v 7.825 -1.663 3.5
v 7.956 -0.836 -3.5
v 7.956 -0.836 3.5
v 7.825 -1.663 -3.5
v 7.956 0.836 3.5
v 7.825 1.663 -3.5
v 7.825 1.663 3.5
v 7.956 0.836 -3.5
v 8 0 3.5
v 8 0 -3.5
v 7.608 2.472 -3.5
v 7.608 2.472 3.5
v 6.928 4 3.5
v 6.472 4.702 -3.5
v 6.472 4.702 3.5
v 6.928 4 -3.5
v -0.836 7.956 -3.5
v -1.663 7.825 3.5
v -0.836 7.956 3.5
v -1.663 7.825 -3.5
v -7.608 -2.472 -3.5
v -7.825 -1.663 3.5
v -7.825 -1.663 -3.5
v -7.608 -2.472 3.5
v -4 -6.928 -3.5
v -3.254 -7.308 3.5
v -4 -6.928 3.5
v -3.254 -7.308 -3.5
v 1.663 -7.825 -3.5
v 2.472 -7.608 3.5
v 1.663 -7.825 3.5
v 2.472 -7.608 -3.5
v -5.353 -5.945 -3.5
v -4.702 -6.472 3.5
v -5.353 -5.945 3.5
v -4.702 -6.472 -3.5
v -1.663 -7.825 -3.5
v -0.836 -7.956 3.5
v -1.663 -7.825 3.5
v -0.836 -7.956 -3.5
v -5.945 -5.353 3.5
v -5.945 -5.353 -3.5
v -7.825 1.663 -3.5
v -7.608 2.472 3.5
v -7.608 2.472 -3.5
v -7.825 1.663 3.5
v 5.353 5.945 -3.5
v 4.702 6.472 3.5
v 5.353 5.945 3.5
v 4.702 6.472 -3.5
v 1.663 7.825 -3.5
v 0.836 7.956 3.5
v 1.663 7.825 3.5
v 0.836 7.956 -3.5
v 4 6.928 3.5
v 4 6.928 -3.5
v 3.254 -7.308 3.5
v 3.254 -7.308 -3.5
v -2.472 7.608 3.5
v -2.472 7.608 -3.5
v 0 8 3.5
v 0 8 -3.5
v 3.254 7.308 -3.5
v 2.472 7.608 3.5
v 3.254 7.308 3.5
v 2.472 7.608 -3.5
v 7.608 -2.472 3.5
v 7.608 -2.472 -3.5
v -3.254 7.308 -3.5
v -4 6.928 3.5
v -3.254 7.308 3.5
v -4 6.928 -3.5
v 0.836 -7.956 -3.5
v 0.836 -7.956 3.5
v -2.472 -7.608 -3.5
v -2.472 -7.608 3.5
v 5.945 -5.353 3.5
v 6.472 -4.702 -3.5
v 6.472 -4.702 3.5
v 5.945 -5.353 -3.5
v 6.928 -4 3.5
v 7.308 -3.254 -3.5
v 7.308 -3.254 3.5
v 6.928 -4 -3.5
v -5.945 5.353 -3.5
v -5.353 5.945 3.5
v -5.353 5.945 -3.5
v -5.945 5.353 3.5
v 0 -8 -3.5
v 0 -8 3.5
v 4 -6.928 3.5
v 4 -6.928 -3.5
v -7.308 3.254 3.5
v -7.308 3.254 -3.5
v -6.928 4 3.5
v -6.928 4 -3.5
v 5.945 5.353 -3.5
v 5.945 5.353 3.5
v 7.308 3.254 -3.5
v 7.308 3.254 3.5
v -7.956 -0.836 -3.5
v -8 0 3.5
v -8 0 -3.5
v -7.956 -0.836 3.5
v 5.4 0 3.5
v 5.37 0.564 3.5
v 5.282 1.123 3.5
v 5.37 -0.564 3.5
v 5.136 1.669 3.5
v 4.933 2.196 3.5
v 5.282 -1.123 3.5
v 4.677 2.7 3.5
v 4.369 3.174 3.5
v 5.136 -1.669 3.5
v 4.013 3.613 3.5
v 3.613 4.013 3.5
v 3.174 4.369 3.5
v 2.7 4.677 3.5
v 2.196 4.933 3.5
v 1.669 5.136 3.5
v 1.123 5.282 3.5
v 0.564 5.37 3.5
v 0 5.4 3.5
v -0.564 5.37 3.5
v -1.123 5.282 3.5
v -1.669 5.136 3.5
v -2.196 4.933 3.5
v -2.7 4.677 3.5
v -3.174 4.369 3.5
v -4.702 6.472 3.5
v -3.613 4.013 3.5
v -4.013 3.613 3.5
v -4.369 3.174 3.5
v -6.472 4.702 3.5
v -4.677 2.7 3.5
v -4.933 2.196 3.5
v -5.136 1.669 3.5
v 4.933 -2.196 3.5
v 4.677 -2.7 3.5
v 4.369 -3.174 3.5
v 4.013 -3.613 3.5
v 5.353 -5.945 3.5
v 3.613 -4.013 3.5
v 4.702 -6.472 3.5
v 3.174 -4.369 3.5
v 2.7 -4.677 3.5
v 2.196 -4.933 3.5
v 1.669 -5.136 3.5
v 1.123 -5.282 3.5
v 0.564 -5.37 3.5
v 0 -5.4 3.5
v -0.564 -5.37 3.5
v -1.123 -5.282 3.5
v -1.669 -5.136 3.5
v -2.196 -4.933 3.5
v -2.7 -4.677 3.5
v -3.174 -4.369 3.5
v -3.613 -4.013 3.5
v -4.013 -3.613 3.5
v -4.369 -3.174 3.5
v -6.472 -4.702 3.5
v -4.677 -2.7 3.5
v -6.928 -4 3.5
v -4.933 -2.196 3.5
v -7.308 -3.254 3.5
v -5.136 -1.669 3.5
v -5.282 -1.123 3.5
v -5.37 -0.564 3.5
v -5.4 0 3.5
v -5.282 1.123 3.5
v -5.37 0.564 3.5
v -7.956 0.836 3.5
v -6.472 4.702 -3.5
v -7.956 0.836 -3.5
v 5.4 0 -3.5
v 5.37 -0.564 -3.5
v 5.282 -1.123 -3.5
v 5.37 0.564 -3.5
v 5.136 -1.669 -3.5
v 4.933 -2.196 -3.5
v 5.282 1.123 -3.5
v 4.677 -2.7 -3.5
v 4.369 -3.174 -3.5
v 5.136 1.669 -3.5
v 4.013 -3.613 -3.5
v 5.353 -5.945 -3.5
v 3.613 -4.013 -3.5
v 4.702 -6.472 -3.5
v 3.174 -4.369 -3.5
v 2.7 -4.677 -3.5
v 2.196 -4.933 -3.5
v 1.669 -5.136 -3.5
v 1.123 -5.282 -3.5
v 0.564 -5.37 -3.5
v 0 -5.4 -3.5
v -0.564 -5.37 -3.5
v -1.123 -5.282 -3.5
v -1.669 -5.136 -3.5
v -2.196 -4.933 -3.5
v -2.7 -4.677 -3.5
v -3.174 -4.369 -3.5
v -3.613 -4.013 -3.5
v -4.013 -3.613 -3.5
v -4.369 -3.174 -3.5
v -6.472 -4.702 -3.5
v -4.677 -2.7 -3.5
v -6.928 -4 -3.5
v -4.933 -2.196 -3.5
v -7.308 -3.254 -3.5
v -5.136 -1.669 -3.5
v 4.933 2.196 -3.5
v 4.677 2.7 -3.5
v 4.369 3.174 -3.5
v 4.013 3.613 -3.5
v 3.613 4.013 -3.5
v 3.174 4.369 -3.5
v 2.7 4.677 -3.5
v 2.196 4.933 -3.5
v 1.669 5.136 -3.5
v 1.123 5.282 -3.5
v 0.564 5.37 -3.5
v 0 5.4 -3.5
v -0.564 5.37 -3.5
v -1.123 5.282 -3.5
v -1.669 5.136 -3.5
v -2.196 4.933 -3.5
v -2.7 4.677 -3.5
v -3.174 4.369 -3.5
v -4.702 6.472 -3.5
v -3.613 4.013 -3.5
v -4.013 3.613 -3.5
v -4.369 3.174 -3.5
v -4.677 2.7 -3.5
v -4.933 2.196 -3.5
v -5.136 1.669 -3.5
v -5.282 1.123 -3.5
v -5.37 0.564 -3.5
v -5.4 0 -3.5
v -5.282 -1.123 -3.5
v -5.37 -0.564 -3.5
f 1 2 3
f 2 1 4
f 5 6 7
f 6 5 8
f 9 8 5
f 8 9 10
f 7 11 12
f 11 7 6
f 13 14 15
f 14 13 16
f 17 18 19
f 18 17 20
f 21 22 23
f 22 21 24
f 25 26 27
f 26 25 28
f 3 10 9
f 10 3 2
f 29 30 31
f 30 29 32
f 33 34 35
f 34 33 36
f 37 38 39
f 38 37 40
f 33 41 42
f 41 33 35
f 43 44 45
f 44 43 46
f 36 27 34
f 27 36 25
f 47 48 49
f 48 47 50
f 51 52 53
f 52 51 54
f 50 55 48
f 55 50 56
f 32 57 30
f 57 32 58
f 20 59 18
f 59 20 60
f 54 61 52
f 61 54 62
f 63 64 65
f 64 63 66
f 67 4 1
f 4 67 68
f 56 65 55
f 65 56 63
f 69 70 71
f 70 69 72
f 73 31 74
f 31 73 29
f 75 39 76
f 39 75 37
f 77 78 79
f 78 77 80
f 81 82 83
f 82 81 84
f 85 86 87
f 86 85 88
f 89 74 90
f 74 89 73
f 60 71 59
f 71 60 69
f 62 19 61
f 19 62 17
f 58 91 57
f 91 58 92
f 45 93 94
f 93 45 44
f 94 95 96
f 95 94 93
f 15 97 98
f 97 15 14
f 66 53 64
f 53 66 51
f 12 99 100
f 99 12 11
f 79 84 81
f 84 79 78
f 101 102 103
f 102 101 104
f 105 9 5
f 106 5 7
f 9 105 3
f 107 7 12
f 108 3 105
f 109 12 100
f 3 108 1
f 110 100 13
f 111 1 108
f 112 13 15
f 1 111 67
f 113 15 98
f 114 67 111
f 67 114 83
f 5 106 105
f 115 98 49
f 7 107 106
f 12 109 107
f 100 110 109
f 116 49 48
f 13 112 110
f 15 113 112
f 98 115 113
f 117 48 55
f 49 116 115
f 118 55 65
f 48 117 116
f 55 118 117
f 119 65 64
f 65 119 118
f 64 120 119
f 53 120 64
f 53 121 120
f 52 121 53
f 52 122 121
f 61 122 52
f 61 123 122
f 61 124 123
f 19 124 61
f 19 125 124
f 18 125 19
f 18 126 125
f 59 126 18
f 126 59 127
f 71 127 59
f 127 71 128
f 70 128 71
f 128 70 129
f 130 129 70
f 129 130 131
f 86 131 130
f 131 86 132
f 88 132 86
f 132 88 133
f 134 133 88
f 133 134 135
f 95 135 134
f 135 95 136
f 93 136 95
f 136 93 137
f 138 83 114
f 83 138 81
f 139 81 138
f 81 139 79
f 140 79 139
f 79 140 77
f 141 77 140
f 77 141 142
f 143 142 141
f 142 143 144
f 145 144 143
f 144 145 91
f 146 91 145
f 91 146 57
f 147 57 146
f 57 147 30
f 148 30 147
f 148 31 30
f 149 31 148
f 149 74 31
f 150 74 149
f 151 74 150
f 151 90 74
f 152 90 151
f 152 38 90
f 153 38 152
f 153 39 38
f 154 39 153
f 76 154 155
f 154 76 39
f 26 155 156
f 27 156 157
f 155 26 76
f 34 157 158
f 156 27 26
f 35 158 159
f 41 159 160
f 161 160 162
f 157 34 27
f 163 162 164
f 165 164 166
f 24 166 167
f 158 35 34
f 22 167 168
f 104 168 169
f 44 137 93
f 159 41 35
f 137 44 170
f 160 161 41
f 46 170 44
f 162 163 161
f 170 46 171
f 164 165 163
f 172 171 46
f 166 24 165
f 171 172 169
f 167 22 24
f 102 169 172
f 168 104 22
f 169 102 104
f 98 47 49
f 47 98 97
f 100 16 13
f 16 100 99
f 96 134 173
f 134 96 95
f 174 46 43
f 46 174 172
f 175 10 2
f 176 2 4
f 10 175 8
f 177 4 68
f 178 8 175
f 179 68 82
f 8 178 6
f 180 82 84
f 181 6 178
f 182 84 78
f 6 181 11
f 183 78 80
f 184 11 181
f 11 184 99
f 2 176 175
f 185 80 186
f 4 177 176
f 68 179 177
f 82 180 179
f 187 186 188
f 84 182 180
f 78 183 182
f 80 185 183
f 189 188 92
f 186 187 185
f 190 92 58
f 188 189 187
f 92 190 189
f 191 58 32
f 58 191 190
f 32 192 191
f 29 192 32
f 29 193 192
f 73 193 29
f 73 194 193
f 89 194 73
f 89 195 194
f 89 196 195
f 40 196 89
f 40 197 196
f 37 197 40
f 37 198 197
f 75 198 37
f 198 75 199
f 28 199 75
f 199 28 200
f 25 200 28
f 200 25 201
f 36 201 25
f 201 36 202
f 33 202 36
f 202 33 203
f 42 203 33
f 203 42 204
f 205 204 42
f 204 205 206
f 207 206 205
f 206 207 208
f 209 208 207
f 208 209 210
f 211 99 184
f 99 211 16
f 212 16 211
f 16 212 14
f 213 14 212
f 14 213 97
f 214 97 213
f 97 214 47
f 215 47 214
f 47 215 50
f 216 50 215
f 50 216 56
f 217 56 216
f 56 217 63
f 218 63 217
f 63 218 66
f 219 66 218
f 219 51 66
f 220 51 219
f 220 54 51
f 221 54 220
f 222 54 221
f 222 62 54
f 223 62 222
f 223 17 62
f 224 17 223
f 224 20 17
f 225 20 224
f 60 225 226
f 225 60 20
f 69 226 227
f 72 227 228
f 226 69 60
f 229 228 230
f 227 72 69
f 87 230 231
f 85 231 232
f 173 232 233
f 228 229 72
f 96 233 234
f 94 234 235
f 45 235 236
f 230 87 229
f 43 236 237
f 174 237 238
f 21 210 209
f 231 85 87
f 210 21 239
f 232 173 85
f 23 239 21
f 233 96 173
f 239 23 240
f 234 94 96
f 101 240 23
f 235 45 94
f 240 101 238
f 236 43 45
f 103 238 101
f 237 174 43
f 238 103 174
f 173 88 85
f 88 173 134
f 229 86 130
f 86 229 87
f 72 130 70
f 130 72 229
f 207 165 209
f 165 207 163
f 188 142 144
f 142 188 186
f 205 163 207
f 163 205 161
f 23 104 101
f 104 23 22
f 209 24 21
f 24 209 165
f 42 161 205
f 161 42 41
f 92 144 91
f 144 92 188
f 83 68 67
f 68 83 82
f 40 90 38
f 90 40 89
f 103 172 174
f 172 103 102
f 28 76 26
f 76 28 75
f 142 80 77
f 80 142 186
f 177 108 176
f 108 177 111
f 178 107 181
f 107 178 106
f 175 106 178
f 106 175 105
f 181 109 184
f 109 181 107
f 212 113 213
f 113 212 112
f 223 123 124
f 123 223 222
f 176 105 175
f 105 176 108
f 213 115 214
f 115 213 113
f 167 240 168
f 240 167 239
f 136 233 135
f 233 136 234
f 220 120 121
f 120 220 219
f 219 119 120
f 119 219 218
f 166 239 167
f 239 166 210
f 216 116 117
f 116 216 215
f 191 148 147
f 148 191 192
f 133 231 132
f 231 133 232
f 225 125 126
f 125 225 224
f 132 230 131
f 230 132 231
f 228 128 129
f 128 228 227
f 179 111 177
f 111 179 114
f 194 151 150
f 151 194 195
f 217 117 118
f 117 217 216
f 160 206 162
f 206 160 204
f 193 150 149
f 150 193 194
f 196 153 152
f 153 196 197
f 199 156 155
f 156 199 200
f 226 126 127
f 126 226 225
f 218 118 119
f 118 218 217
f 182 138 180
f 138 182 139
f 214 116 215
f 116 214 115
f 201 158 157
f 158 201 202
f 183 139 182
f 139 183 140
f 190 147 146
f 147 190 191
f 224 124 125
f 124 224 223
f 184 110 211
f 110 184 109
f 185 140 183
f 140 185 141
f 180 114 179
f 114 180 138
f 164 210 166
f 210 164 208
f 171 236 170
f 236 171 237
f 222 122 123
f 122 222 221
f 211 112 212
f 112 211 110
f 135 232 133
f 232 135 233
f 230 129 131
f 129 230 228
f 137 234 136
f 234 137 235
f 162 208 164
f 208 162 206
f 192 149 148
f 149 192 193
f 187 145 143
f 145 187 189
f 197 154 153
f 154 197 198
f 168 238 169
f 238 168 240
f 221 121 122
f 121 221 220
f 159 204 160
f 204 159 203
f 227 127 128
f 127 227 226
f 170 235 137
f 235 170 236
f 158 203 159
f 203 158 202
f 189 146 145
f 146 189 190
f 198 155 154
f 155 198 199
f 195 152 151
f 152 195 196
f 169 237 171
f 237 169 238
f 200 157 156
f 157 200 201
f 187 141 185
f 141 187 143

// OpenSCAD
$fn=60;

difference() {
    cylinder(r=8, h=7,center=true);
    cylinder(r=5.4, h=8, center=true);
}
